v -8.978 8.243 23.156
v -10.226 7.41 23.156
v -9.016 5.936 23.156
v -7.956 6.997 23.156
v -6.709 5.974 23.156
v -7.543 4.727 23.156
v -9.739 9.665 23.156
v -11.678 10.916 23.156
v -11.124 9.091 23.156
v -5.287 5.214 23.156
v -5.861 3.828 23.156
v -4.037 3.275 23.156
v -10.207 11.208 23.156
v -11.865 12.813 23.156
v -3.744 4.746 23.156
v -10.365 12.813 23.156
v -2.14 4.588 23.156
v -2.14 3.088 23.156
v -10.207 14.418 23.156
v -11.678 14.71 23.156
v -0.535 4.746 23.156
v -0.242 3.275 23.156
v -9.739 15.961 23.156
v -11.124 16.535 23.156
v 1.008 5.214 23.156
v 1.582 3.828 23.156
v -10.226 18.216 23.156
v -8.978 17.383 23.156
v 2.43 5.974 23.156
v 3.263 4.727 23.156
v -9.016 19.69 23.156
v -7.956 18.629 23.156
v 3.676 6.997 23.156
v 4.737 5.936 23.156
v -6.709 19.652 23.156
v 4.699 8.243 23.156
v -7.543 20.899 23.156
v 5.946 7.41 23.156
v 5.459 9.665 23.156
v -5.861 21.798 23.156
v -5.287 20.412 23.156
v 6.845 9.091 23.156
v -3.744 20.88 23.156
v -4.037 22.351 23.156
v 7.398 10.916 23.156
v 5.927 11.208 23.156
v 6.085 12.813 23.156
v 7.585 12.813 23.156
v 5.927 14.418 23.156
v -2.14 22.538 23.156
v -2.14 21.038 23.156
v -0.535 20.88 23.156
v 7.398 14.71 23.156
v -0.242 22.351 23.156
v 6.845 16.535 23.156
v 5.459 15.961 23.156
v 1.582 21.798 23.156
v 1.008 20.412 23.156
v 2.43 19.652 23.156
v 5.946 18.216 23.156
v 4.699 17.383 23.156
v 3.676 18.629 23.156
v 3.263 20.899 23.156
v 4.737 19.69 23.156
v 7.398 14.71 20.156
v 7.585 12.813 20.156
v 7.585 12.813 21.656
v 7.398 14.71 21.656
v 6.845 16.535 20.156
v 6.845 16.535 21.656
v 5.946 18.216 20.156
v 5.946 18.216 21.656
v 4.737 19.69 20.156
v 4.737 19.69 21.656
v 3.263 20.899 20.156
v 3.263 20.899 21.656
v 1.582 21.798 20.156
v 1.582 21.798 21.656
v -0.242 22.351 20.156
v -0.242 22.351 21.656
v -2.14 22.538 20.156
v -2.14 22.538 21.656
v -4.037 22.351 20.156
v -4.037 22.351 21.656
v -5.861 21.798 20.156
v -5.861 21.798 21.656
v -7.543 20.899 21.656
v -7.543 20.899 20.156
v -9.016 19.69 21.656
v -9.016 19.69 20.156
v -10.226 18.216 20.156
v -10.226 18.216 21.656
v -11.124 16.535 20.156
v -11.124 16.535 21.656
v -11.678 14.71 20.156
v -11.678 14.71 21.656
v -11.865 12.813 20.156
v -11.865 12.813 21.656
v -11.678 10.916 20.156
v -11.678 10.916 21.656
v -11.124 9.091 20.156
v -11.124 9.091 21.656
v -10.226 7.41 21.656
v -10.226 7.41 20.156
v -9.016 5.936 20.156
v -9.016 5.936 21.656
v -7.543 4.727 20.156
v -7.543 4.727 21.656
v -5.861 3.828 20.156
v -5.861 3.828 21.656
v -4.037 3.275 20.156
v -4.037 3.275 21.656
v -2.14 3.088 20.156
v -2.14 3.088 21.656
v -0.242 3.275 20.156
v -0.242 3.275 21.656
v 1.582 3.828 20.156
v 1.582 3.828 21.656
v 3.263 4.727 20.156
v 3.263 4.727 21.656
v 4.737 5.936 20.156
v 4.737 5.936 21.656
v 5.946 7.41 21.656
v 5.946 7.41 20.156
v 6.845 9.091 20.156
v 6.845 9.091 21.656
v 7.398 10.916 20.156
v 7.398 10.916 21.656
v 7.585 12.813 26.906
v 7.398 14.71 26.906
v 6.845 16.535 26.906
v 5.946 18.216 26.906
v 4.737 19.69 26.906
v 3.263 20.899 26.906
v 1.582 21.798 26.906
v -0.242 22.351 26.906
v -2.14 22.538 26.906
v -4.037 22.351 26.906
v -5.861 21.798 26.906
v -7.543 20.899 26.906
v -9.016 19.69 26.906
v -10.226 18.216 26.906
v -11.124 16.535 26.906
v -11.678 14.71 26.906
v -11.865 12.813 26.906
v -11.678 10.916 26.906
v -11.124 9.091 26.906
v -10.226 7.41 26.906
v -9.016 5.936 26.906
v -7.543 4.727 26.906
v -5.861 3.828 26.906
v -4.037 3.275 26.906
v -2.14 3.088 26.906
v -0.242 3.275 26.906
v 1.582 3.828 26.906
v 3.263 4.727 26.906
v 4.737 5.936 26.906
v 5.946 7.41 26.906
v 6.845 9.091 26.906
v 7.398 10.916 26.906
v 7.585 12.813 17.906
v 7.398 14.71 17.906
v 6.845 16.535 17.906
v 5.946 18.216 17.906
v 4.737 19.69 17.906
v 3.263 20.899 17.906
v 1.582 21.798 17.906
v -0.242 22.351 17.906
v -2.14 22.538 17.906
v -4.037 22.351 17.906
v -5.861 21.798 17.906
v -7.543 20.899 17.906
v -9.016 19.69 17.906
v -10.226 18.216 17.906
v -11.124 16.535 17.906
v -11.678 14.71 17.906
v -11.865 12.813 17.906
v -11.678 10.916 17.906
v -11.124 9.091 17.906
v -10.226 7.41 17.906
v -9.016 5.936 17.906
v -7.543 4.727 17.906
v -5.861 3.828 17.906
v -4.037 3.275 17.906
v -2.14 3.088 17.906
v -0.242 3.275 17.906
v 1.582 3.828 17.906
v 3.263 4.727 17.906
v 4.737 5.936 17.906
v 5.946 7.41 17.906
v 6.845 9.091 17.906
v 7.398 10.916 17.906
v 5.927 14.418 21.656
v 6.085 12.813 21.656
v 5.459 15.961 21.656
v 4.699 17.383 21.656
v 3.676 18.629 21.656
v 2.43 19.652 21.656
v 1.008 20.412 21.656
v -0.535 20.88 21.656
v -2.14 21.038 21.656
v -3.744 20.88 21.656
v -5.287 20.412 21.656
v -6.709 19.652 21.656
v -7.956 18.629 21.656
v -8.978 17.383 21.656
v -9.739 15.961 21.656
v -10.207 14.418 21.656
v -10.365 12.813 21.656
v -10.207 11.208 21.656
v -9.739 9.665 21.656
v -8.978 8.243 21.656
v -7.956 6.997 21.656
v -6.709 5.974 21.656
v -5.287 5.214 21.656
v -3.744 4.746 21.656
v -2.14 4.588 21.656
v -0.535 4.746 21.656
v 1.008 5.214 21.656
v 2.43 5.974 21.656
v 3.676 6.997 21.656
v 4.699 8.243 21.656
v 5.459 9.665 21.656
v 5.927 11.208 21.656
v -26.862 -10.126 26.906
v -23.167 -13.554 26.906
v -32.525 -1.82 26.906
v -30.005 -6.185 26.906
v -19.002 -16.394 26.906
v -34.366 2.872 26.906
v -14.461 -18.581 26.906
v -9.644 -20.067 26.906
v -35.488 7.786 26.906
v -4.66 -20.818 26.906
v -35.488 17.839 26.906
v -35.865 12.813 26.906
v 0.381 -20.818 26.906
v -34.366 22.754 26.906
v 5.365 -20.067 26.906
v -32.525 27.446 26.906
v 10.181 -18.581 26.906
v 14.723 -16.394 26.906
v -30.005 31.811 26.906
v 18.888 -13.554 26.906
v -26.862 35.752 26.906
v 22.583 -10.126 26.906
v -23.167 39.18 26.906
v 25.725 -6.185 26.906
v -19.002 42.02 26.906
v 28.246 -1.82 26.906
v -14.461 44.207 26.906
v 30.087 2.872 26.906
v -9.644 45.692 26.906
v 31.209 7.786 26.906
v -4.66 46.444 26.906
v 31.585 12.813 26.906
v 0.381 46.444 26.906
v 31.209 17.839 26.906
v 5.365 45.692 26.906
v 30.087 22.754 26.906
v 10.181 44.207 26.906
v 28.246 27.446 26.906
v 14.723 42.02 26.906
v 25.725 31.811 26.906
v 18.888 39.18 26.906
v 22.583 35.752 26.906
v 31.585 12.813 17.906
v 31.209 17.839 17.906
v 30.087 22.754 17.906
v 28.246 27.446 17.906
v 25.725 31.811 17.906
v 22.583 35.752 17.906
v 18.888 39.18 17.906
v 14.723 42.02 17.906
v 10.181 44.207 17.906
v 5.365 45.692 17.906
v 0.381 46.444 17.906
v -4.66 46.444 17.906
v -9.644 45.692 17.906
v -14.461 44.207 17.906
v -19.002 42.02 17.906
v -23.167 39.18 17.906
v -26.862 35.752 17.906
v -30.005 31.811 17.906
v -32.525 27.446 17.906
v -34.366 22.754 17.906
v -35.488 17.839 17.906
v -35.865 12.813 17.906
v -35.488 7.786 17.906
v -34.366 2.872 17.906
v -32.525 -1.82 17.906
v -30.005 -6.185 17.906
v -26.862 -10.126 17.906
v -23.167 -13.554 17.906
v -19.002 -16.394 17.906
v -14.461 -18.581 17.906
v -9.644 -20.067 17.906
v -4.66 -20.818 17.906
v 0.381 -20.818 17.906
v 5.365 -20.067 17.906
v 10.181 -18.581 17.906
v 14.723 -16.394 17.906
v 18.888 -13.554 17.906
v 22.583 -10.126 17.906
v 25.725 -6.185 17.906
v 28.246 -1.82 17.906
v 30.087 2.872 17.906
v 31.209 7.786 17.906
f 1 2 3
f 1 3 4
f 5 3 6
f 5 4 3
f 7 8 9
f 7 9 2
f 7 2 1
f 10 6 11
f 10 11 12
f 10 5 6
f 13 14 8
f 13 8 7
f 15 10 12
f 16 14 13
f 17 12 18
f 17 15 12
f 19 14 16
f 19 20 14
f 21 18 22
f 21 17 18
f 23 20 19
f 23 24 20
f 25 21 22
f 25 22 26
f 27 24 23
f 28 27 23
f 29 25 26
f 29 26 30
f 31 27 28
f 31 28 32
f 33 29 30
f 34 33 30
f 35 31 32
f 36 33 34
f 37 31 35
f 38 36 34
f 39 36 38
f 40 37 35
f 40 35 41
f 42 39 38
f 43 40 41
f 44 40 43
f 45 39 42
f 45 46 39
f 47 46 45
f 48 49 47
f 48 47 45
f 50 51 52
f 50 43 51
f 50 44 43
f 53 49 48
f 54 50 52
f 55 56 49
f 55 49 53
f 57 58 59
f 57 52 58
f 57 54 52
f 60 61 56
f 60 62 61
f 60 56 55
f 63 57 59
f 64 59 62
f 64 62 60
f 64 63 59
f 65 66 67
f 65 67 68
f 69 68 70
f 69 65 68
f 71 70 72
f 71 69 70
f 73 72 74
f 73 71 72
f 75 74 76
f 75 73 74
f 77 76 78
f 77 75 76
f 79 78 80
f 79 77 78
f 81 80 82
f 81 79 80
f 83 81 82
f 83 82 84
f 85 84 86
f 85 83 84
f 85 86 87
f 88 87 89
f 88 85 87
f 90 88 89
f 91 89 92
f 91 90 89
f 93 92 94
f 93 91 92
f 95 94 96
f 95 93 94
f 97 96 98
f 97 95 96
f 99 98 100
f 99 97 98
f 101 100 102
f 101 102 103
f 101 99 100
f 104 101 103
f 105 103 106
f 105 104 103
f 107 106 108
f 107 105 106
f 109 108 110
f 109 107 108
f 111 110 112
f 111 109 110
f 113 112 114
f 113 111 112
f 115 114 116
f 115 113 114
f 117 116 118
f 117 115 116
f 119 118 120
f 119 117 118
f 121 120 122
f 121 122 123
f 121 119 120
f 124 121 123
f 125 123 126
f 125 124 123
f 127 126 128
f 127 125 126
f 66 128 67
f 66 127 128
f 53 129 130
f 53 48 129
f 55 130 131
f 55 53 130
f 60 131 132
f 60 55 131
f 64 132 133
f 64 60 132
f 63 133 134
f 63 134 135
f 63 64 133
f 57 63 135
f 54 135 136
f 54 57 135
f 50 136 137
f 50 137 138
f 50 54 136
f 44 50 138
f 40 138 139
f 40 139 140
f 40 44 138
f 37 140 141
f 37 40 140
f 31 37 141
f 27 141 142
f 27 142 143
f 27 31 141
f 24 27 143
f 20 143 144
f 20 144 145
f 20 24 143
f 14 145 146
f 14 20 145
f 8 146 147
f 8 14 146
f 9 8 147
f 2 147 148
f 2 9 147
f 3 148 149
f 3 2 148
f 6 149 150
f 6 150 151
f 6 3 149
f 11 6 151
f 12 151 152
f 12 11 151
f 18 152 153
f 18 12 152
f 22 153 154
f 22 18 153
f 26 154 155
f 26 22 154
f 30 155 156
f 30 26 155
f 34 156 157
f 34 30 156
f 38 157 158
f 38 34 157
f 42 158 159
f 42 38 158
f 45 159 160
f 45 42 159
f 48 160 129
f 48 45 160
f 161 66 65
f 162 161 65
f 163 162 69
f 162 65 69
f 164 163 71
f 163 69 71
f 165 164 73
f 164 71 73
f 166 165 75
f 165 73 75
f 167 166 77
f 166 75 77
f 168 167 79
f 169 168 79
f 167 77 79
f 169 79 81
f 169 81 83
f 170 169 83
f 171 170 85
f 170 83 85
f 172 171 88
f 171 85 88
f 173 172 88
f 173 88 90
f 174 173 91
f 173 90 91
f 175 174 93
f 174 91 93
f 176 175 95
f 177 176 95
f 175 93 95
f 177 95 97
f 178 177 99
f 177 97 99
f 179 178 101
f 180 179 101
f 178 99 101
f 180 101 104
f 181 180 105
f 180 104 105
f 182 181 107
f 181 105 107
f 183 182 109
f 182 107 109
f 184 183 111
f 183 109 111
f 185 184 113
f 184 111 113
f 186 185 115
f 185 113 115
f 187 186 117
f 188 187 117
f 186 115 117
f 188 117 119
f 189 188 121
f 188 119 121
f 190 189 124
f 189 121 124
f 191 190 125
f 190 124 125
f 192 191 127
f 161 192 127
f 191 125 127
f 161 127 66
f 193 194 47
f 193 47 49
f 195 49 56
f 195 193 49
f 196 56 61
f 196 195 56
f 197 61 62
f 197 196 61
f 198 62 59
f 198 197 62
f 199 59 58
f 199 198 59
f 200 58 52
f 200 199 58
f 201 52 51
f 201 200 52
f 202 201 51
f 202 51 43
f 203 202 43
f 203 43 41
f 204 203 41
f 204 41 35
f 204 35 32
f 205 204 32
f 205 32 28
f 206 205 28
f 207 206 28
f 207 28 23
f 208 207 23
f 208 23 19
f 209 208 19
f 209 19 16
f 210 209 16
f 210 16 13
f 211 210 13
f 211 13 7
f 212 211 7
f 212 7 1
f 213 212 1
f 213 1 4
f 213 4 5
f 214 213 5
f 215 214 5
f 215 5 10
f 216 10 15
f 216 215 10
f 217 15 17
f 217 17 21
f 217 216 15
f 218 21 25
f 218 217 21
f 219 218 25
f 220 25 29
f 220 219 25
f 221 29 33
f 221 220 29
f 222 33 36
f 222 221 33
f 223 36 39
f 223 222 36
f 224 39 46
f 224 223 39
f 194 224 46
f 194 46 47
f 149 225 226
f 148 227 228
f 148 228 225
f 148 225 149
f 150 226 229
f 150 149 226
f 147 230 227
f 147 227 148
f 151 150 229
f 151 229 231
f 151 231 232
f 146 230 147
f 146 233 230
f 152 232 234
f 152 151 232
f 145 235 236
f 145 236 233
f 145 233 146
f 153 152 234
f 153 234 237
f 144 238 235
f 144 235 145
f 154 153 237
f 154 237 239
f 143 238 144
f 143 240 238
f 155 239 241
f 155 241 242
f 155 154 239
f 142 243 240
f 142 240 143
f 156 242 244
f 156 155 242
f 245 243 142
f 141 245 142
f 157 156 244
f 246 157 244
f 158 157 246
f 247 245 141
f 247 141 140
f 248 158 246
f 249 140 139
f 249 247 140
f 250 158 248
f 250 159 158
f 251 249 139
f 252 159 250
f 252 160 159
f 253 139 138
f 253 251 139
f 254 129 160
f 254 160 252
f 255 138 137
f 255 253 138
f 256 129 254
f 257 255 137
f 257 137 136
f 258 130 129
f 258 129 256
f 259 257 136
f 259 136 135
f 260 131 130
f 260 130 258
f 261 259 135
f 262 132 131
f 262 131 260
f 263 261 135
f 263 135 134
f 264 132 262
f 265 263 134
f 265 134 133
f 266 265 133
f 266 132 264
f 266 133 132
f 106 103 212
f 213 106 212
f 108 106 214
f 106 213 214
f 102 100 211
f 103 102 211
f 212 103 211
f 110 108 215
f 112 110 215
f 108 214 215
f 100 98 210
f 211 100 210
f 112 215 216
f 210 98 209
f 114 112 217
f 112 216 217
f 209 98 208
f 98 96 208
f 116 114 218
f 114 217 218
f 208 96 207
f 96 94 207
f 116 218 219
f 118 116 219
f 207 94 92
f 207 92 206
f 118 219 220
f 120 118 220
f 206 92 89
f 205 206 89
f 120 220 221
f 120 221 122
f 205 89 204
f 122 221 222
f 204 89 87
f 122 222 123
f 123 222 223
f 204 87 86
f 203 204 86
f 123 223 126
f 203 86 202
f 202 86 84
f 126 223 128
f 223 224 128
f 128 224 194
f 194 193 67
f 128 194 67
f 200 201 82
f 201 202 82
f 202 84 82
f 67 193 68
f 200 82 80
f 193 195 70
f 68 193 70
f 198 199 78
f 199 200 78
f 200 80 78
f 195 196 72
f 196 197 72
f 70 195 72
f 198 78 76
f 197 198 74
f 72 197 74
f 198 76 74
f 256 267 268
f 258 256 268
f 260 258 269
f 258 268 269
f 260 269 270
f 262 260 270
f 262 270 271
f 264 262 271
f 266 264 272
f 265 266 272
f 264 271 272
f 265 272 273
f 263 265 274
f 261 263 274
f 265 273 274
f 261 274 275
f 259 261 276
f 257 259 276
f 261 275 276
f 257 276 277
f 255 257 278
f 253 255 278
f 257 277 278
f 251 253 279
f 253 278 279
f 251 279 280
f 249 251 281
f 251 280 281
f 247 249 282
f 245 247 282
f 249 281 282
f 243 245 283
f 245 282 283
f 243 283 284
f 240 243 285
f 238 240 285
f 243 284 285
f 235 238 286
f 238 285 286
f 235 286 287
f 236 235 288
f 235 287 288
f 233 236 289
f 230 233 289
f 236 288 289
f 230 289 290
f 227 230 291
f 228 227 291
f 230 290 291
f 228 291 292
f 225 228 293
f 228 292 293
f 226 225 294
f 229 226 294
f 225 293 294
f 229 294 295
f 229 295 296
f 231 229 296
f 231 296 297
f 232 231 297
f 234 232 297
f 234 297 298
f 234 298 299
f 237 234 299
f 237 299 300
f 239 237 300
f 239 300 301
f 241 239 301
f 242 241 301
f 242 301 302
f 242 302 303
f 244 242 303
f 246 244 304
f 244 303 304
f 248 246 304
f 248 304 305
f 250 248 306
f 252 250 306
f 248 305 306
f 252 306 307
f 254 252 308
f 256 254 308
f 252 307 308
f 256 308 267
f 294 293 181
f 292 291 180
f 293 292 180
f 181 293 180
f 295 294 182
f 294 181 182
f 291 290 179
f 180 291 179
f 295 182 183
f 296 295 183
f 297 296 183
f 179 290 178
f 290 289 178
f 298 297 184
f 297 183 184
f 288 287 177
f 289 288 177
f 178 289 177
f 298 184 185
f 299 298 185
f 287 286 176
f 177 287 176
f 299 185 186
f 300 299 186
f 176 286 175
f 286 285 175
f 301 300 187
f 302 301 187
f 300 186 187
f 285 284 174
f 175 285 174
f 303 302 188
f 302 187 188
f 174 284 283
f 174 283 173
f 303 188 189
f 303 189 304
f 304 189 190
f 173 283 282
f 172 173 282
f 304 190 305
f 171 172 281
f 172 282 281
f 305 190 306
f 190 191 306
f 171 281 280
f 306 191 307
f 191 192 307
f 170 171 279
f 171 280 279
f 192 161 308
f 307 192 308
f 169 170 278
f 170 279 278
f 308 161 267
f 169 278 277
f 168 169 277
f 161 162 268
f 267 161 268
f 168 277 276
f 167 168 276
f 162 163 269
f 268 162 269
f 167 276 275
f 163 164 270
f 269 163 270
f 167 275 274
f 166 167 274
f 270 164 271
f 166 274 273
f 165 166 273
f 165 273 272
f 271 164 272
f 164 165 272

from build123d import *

# Parameters (mm, degrees)
BOSS_EXTRUDE1_DEPTH      = 4.5
BOSS_EXTRUDE1_DEPTH_BACK = 4.5
SKETCH1_R                = 33.725
CAVITY1_START            = 20.155580463
CAVITY1_OUTLINE_R        = 8.225
CAVITY1_DEPTH            = 4.5
CAVITY1_2_OUTLINE_R      = 9.725
CAVITY1_2_OUTLINE_R_2    = 8.225
CAVITY1_2_DEPTH          = 1.5
CAVITY1_START_2          = 23.155580463
CAVITY1_3_OUTLINE_R      = 9.725
CAVITY1_3_OUTLINE_R_2    = 8.225
CAVITY1_3_DEPTH          = 1.5
CAVITY1_START_3          = 17.905580463
CAVITY1_4_OUTLINE_R      = 3.725
CAVITY1_4_DEPTH          = 2.25
CAVITY1_5_DEPTH          = 2.25
CUT_EXTRUDE1_START       = 2.25
SKETCH1_3_R              = 9.725
CUT_EXTRUDE1_DEPTH       = 2.25
CUT_EXTRUDE2_DEPTH       = 2.25


with BuildPart() as part:
    # Sketch1 → Boss-Extrude1 (new, two sides: drawn at the far end of the back side and taken through both)
    with BuildSketch(Plane.XY.offset(22.405580463).offset(-BOSS_EXTRUDE1_DEPTH_BACK)):
        with Locations((-2.139643456, 12.812935379)):
            Circle(SKETCH1_R)
    extrude(amount=BOSS_EXTRUDE1_DEPTH + BOSS_EXTRUDE1_DEPTH_BACK)

    # Cavity1: read off the stored shape, not the designer's step
    # Cavity1 outline → Cavity1 (cut)
    with BuildSketch(Plane.XY.offset(CAVITY1_START)):
        with Locations((-2.139643456, 12.812935379)):
            Circle(CAVITY1_OUTLINE_R)
    extrude(amount=CAVITY1_DEPTH, mode=Mode.SUBTRACT)

    # Cavity1 2 outline → Cavity1 2 (cut)
    with BuildSketch(Plane.XY.offset(CAVITY1_START)):
        with Locations((-2.139643456, 12.812935379)):
            Circle(CAVITY1_2_OUTLINE_R)
        with Locations((-2.139643456, 12.812935379)):
            Circle(CAVITY1_2_OUTLINE_R_2, mode=Mode.SUBTRACT)
    extrude(amount=CAVITY1_2_DEPTH, mode=Mode.SUBTRACT)

    # Cavity1 3 outline → Cavity1 3 (cut)
    with BuildSketch(Plane.XY.offset(CAVITY1_START_2)):
        with Locations((-2.139643456, 12.812935379)):
            Circle(CAVITY1_3_OUTLINE_R)
        with Locations((-2.139643456, 12.812935379)):
            Circle(CAVITY1_3_OUTLINE_R_2, mode=Mode.SUBTRACT)
    extrude(amount=CAVITY1_3_DEPTH, mode=Mode.SUBTRACT)

    # Cavity1 4 outline → Cavity1 4 (cut)
    with BuildSketch(Plane.XY.offset(CAVITY1_START_3)):
        with Locations((-2.139643456, 12.812935379)):
            Circle(CAVITY1_4_OUTLINE_R)
    extrude(amount=CAVITY1_4_DEPTH, mode=Mode.SUBTRACT)

    # Sketch1<3> → Cut-Extrude1 (cut)
    with BuildSketch(Plane.XY.offset(22.405580463).offset(CUT_EXTRUDE1_START)):
        with Locations((-2.139643456, 12.812935379)):
            Circle(SKETCH1_3_R)
    cut_extrude1 = extrude(amount=CUT_EXTRUDE1_DEPTH, mode=Mode.SUBTRACT)

    # Mirror1: Cut-Extrude1 across plane
    add(cut_extrude1.mirror(Plane.XY.offset(22.405580463)), mode=Mode.SUBTRACT)


with BuildPart() as body_2:
    # Cavity1 5 outline → Cavity1 5 (new body)
    with BuildSketch(Plane.XY.offset(CAVITY1_START_3)):
        with BuildLine():
            ThreePointArc((-4.026439682, 14.637935379), (-4.764643456, 12.812935379), (-4.026439682, 10.987935379))
            Line((-4.026439682, 10.987935379), (-0.252847229, 10.987935379))
            ThreePointArc((-0.252847229, 10.987935379), (0.485356544, 12.812935379), (-0.252847229, 14.637935379))
            Line((-0.252847229, 14.637935379), (-4.026439682, 14.637935379))
        make_face()
    extrude(amount=CAVITY1_5_DEPTH)

    # Sketch2 → Cut-Extrude2 (cut)
    with BuildSketch(Plane.XY.offset(20.155580463)):
        with BuildLine():
            Line((-0.252847229, 14.637935379), (-4.026439682, 14.637935379))
            ThreePointArc((-4.026439682, 14.637935379), (-4.764643456, 12.812935379), (-4.026439682, 10.987935379))
            Line((-4.026439682, 10.987935379), (-0.252847229, 10.987935379))
            ThreePointArc((-0.252847229, 10.987935379), (0.485356544, 12.812935379), (-0.252847229, 14.637935379))
        make_face()
    extrude(amount=-CUT_EXTRUDE2_DEPTH, mode=Mode.SUBTRACT)


solid = part.part
